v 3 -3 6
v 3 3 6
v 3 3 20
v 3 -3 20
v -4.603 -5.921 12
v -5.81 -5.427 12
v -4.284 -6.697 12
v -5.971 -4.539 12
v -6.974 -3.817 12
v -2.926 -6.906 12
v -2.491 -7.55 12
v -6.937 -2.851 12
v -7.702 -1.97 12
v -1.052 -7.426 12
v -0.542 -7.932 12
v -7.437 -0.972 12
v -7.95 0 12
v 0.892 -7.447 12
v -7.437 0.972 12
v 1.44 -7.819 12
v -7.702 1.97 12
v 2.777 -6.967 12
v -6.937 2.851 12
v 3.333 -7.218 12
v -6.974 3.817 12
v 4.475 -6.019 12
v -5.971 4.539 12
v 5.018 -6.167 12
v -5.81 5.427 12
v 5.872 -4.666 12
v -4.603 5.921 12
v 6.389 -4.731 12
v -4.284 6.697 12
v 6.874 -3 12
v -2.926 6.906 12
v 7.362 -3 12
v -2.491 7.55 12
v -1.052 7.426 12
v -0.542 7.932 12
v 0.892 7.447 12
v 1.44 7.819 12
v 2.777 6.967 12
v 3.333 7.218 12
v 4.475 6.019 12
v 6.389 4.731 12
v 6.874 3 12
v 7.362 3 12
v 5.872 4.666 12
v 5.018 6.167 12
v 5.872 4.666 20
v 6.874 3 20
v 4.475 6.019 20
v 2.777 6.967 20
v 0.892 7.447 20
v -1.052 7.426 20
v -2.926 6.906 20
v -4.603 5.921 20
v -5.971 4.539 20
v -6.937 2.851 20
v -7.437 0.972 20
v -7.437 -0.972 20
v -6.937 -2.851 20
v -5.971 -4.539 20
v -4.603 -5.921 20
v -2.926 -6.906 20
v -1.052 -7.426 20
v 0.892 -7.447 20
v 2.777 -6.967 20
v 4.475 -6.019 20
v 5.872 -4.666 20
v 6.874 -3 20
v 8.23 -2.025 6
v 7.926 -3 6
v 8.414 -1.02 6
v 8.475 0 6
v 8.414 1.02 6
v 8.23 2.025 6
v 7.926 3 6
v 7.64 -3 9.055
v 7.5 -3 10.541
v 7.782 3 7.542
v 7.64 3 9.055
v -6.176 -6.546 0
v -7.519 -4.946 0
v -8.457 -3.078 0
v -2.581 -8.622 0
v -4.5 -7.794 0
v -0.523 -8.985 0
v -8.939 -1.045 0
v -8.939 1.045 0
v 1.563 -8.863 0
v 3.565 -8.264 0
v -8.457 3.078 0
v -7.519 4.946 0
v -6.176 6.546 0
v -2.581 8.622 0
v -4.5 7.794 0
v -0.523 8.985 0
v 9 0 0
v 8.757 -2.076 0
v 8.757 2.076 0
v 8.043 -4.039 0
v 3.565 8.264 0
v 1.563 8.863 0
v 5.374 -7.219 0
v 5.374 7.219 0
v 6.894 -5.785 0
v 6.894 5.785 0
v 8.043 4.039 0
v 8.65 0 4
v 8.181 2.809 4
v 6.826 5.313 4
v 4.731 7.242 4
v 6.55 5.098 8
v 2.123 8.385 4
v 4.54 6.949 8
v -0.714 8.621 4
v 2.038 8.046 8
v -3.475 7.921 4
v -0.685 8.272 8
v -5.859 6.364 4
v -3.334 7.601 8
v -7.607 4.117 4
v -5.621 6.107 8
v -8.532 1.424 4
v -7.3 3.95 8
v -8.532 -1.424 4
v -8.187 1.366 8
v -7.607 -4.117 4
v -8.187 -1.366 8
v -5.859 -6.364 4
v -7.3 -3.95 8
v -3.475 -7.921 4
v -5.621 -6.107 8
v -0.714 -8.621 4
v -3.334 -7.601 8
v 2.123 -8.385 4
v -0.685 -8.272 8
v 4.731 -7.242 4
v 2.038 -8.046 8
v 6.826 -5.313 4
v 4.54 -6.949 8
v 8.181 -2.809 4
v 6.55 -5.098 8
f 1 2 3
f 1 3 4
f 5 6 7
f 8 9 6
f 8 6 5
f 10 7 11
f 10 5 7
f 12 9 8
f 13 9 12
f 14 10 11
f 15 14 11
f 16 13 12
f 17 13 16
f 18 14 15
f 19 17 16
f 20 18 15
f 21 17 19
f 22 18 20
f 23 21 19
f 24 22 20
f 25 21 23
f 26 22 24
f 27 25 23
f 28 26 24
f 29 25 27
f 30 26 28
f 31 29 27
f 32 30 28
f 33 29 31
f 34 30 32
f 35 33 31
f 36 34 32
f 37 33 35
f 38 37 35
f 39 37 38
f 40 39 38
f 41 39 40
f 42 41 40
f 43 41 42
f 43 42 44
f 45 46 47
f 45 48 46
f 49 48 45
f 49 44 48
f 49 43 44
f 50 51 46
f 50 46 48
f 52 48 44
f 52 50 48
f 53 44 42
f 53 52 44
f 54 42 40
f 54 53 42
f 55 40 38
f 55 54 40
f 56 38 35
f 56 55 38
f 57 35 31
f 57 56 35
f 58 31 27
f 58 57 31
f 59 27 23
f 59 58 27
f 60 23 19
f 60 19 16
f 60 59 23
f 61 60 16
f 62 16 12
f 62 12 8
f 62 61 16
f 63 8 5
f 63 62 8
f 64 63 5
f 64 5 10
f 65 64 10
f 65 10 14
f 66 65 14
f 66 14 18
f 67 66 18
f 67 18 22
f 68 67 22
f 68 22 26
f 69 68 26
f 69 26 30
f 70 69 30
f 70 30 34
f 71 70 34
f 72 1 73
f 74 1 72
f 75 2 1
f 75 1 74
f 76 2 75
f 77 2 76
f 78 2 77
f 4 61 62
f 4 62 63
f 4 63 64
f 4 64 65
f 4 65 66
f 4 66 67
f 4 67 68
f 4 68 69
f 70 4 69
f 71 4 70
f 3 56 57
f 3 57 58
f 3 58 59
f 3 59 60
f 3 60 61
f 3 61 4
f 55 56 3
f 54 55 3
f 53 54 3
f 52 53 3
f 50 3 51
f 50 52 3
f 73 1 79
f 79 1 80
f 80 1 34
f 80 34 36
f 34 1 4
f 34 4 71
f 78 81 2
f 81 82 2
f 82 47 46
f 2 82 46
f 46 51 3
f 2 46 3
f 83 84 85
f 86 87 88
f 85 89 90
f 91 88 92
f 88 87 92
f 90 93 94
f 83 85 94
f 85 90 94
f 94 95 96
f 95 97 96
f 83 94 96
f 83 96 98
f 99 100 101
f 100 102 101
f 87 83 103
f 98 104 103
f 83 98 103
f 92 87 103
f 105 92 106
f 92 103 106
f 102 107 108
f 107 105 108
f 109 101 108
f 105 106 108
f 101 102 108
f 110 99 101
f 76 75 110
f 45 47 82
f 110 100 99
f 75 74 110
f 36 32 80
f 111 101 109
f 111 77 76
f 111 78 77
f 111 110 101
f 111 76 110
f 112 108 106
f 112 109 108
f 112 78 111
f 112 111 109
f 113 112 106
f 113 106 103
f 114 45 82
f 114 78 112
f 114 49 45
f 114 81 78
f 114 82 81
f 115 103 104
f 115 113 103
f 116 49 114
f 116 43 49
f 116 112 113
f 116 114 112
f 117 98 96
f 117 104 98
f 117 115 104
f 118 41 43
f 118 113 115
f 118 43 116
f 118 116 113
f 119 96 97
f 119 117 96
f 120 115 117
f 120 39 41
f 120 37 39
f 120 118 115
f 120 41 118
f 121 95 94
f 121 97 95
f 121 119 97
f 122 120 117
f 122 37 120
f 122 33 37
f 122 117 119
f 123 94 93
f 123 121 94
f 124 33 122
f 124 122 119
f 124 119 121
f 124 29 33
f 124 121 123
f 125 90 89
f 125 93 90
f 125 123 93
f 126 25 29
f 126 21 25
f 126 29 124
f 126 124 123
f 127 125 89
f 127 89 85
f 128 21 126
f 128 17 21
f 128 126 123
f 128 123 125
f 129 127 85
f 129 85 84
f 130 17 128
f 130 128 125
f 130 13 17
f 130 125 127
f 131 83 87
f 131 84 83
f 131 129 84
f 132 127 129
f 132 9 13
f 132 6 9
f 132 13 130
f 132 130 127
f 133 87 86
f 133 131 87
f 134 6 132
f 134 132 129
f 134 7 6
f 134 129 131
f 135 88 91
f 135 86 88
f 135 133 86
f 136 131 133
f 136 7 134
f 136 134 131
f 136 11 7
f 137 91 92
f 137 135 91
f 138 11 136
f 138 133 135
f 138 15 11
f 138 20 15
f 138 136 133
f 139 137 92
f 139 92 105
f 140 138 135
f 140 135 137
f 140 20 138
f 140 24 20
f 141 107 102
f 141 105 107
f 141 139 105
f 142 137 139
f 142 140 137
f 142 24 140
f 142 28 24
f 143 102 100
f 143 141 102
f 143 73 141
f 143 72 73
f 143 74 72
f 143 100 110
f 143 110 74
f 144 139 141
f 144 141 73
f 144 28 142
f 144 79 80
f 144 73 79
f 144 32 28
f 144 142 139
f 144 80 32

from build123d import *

# Parameters (mm, degrees)
F0_R     = 9
F1_DEPTH = 20
F1_TAPER = 5
F2_R     = 7.5
F2_R_2   = 7.2502267295
F3_DEPTH = 10
F4_R     = 9
F4_R_2   = 7.5
F5_DEPTH = 8
F7_DEPTH = 14


with BuildPart() as f1:
    # F0 (on Top) → F1 (new body)
    with BuildSketch(Plane.XY):
        Circle(F0_R)
    extrude(amount=F1_DEPTH, taper=F1_TAPER)

    # F2 (on face) → F3 (join)
    with BuildSketch(Plane.XY.offset(20)):
        Circle(F2_R)
        Circle(F2_R_2, mode=Mode.SUBTRACT)
    extrude(amount=-F3_DEPTH)

    # F4 (on face) → F5 (cut)
    with BuildSketch(Plane.XY.offset(20)):
        Circle(F4_R)
        Circle(F4_R_2, mode=Mode.SUBTRACT)
    extrude(amount=-F5_DEPTH, mode=Mode.SUBTRACT)

    # F6 (on face) → F7 (cut)
    with BuildSketch(Plane.XY.offset(20)):
        with BuildLine():
            Line((6.8738635424, -3), (8.9953789802, -3))
            Line((8.9953789802, -3), (8.9953789802, 3))
            Line((8.9953789802, 3), (6.8738635424, 3))
            ThreePointArc((6.8738635424, 3), (7.341797347, 1.5323223277), (7.5, 0))
            ThreePointArc((7.5, 0), (7.341797347, -1.5323223277), (6.8738635424, -3))
        make_face()
        with BuildLine():
            Line((3, -3), (6.8738635424, -3))
            ThreePointArc((6.8738635424, -3), (7.341797347, -1.5323223277), (7.5, 0))
            ThreePointArc((7.5, 0), (7.341797347, 1.5323223277), (6.8738635424, 3))
            Line((6.8738635424, 3), (3, 3))
            Line((3, 3), (3, -3))
        make_face()
    extrude(amount=-F7_DEPTH, mode=Mode.SUBTRACT)


solid = f1.part
